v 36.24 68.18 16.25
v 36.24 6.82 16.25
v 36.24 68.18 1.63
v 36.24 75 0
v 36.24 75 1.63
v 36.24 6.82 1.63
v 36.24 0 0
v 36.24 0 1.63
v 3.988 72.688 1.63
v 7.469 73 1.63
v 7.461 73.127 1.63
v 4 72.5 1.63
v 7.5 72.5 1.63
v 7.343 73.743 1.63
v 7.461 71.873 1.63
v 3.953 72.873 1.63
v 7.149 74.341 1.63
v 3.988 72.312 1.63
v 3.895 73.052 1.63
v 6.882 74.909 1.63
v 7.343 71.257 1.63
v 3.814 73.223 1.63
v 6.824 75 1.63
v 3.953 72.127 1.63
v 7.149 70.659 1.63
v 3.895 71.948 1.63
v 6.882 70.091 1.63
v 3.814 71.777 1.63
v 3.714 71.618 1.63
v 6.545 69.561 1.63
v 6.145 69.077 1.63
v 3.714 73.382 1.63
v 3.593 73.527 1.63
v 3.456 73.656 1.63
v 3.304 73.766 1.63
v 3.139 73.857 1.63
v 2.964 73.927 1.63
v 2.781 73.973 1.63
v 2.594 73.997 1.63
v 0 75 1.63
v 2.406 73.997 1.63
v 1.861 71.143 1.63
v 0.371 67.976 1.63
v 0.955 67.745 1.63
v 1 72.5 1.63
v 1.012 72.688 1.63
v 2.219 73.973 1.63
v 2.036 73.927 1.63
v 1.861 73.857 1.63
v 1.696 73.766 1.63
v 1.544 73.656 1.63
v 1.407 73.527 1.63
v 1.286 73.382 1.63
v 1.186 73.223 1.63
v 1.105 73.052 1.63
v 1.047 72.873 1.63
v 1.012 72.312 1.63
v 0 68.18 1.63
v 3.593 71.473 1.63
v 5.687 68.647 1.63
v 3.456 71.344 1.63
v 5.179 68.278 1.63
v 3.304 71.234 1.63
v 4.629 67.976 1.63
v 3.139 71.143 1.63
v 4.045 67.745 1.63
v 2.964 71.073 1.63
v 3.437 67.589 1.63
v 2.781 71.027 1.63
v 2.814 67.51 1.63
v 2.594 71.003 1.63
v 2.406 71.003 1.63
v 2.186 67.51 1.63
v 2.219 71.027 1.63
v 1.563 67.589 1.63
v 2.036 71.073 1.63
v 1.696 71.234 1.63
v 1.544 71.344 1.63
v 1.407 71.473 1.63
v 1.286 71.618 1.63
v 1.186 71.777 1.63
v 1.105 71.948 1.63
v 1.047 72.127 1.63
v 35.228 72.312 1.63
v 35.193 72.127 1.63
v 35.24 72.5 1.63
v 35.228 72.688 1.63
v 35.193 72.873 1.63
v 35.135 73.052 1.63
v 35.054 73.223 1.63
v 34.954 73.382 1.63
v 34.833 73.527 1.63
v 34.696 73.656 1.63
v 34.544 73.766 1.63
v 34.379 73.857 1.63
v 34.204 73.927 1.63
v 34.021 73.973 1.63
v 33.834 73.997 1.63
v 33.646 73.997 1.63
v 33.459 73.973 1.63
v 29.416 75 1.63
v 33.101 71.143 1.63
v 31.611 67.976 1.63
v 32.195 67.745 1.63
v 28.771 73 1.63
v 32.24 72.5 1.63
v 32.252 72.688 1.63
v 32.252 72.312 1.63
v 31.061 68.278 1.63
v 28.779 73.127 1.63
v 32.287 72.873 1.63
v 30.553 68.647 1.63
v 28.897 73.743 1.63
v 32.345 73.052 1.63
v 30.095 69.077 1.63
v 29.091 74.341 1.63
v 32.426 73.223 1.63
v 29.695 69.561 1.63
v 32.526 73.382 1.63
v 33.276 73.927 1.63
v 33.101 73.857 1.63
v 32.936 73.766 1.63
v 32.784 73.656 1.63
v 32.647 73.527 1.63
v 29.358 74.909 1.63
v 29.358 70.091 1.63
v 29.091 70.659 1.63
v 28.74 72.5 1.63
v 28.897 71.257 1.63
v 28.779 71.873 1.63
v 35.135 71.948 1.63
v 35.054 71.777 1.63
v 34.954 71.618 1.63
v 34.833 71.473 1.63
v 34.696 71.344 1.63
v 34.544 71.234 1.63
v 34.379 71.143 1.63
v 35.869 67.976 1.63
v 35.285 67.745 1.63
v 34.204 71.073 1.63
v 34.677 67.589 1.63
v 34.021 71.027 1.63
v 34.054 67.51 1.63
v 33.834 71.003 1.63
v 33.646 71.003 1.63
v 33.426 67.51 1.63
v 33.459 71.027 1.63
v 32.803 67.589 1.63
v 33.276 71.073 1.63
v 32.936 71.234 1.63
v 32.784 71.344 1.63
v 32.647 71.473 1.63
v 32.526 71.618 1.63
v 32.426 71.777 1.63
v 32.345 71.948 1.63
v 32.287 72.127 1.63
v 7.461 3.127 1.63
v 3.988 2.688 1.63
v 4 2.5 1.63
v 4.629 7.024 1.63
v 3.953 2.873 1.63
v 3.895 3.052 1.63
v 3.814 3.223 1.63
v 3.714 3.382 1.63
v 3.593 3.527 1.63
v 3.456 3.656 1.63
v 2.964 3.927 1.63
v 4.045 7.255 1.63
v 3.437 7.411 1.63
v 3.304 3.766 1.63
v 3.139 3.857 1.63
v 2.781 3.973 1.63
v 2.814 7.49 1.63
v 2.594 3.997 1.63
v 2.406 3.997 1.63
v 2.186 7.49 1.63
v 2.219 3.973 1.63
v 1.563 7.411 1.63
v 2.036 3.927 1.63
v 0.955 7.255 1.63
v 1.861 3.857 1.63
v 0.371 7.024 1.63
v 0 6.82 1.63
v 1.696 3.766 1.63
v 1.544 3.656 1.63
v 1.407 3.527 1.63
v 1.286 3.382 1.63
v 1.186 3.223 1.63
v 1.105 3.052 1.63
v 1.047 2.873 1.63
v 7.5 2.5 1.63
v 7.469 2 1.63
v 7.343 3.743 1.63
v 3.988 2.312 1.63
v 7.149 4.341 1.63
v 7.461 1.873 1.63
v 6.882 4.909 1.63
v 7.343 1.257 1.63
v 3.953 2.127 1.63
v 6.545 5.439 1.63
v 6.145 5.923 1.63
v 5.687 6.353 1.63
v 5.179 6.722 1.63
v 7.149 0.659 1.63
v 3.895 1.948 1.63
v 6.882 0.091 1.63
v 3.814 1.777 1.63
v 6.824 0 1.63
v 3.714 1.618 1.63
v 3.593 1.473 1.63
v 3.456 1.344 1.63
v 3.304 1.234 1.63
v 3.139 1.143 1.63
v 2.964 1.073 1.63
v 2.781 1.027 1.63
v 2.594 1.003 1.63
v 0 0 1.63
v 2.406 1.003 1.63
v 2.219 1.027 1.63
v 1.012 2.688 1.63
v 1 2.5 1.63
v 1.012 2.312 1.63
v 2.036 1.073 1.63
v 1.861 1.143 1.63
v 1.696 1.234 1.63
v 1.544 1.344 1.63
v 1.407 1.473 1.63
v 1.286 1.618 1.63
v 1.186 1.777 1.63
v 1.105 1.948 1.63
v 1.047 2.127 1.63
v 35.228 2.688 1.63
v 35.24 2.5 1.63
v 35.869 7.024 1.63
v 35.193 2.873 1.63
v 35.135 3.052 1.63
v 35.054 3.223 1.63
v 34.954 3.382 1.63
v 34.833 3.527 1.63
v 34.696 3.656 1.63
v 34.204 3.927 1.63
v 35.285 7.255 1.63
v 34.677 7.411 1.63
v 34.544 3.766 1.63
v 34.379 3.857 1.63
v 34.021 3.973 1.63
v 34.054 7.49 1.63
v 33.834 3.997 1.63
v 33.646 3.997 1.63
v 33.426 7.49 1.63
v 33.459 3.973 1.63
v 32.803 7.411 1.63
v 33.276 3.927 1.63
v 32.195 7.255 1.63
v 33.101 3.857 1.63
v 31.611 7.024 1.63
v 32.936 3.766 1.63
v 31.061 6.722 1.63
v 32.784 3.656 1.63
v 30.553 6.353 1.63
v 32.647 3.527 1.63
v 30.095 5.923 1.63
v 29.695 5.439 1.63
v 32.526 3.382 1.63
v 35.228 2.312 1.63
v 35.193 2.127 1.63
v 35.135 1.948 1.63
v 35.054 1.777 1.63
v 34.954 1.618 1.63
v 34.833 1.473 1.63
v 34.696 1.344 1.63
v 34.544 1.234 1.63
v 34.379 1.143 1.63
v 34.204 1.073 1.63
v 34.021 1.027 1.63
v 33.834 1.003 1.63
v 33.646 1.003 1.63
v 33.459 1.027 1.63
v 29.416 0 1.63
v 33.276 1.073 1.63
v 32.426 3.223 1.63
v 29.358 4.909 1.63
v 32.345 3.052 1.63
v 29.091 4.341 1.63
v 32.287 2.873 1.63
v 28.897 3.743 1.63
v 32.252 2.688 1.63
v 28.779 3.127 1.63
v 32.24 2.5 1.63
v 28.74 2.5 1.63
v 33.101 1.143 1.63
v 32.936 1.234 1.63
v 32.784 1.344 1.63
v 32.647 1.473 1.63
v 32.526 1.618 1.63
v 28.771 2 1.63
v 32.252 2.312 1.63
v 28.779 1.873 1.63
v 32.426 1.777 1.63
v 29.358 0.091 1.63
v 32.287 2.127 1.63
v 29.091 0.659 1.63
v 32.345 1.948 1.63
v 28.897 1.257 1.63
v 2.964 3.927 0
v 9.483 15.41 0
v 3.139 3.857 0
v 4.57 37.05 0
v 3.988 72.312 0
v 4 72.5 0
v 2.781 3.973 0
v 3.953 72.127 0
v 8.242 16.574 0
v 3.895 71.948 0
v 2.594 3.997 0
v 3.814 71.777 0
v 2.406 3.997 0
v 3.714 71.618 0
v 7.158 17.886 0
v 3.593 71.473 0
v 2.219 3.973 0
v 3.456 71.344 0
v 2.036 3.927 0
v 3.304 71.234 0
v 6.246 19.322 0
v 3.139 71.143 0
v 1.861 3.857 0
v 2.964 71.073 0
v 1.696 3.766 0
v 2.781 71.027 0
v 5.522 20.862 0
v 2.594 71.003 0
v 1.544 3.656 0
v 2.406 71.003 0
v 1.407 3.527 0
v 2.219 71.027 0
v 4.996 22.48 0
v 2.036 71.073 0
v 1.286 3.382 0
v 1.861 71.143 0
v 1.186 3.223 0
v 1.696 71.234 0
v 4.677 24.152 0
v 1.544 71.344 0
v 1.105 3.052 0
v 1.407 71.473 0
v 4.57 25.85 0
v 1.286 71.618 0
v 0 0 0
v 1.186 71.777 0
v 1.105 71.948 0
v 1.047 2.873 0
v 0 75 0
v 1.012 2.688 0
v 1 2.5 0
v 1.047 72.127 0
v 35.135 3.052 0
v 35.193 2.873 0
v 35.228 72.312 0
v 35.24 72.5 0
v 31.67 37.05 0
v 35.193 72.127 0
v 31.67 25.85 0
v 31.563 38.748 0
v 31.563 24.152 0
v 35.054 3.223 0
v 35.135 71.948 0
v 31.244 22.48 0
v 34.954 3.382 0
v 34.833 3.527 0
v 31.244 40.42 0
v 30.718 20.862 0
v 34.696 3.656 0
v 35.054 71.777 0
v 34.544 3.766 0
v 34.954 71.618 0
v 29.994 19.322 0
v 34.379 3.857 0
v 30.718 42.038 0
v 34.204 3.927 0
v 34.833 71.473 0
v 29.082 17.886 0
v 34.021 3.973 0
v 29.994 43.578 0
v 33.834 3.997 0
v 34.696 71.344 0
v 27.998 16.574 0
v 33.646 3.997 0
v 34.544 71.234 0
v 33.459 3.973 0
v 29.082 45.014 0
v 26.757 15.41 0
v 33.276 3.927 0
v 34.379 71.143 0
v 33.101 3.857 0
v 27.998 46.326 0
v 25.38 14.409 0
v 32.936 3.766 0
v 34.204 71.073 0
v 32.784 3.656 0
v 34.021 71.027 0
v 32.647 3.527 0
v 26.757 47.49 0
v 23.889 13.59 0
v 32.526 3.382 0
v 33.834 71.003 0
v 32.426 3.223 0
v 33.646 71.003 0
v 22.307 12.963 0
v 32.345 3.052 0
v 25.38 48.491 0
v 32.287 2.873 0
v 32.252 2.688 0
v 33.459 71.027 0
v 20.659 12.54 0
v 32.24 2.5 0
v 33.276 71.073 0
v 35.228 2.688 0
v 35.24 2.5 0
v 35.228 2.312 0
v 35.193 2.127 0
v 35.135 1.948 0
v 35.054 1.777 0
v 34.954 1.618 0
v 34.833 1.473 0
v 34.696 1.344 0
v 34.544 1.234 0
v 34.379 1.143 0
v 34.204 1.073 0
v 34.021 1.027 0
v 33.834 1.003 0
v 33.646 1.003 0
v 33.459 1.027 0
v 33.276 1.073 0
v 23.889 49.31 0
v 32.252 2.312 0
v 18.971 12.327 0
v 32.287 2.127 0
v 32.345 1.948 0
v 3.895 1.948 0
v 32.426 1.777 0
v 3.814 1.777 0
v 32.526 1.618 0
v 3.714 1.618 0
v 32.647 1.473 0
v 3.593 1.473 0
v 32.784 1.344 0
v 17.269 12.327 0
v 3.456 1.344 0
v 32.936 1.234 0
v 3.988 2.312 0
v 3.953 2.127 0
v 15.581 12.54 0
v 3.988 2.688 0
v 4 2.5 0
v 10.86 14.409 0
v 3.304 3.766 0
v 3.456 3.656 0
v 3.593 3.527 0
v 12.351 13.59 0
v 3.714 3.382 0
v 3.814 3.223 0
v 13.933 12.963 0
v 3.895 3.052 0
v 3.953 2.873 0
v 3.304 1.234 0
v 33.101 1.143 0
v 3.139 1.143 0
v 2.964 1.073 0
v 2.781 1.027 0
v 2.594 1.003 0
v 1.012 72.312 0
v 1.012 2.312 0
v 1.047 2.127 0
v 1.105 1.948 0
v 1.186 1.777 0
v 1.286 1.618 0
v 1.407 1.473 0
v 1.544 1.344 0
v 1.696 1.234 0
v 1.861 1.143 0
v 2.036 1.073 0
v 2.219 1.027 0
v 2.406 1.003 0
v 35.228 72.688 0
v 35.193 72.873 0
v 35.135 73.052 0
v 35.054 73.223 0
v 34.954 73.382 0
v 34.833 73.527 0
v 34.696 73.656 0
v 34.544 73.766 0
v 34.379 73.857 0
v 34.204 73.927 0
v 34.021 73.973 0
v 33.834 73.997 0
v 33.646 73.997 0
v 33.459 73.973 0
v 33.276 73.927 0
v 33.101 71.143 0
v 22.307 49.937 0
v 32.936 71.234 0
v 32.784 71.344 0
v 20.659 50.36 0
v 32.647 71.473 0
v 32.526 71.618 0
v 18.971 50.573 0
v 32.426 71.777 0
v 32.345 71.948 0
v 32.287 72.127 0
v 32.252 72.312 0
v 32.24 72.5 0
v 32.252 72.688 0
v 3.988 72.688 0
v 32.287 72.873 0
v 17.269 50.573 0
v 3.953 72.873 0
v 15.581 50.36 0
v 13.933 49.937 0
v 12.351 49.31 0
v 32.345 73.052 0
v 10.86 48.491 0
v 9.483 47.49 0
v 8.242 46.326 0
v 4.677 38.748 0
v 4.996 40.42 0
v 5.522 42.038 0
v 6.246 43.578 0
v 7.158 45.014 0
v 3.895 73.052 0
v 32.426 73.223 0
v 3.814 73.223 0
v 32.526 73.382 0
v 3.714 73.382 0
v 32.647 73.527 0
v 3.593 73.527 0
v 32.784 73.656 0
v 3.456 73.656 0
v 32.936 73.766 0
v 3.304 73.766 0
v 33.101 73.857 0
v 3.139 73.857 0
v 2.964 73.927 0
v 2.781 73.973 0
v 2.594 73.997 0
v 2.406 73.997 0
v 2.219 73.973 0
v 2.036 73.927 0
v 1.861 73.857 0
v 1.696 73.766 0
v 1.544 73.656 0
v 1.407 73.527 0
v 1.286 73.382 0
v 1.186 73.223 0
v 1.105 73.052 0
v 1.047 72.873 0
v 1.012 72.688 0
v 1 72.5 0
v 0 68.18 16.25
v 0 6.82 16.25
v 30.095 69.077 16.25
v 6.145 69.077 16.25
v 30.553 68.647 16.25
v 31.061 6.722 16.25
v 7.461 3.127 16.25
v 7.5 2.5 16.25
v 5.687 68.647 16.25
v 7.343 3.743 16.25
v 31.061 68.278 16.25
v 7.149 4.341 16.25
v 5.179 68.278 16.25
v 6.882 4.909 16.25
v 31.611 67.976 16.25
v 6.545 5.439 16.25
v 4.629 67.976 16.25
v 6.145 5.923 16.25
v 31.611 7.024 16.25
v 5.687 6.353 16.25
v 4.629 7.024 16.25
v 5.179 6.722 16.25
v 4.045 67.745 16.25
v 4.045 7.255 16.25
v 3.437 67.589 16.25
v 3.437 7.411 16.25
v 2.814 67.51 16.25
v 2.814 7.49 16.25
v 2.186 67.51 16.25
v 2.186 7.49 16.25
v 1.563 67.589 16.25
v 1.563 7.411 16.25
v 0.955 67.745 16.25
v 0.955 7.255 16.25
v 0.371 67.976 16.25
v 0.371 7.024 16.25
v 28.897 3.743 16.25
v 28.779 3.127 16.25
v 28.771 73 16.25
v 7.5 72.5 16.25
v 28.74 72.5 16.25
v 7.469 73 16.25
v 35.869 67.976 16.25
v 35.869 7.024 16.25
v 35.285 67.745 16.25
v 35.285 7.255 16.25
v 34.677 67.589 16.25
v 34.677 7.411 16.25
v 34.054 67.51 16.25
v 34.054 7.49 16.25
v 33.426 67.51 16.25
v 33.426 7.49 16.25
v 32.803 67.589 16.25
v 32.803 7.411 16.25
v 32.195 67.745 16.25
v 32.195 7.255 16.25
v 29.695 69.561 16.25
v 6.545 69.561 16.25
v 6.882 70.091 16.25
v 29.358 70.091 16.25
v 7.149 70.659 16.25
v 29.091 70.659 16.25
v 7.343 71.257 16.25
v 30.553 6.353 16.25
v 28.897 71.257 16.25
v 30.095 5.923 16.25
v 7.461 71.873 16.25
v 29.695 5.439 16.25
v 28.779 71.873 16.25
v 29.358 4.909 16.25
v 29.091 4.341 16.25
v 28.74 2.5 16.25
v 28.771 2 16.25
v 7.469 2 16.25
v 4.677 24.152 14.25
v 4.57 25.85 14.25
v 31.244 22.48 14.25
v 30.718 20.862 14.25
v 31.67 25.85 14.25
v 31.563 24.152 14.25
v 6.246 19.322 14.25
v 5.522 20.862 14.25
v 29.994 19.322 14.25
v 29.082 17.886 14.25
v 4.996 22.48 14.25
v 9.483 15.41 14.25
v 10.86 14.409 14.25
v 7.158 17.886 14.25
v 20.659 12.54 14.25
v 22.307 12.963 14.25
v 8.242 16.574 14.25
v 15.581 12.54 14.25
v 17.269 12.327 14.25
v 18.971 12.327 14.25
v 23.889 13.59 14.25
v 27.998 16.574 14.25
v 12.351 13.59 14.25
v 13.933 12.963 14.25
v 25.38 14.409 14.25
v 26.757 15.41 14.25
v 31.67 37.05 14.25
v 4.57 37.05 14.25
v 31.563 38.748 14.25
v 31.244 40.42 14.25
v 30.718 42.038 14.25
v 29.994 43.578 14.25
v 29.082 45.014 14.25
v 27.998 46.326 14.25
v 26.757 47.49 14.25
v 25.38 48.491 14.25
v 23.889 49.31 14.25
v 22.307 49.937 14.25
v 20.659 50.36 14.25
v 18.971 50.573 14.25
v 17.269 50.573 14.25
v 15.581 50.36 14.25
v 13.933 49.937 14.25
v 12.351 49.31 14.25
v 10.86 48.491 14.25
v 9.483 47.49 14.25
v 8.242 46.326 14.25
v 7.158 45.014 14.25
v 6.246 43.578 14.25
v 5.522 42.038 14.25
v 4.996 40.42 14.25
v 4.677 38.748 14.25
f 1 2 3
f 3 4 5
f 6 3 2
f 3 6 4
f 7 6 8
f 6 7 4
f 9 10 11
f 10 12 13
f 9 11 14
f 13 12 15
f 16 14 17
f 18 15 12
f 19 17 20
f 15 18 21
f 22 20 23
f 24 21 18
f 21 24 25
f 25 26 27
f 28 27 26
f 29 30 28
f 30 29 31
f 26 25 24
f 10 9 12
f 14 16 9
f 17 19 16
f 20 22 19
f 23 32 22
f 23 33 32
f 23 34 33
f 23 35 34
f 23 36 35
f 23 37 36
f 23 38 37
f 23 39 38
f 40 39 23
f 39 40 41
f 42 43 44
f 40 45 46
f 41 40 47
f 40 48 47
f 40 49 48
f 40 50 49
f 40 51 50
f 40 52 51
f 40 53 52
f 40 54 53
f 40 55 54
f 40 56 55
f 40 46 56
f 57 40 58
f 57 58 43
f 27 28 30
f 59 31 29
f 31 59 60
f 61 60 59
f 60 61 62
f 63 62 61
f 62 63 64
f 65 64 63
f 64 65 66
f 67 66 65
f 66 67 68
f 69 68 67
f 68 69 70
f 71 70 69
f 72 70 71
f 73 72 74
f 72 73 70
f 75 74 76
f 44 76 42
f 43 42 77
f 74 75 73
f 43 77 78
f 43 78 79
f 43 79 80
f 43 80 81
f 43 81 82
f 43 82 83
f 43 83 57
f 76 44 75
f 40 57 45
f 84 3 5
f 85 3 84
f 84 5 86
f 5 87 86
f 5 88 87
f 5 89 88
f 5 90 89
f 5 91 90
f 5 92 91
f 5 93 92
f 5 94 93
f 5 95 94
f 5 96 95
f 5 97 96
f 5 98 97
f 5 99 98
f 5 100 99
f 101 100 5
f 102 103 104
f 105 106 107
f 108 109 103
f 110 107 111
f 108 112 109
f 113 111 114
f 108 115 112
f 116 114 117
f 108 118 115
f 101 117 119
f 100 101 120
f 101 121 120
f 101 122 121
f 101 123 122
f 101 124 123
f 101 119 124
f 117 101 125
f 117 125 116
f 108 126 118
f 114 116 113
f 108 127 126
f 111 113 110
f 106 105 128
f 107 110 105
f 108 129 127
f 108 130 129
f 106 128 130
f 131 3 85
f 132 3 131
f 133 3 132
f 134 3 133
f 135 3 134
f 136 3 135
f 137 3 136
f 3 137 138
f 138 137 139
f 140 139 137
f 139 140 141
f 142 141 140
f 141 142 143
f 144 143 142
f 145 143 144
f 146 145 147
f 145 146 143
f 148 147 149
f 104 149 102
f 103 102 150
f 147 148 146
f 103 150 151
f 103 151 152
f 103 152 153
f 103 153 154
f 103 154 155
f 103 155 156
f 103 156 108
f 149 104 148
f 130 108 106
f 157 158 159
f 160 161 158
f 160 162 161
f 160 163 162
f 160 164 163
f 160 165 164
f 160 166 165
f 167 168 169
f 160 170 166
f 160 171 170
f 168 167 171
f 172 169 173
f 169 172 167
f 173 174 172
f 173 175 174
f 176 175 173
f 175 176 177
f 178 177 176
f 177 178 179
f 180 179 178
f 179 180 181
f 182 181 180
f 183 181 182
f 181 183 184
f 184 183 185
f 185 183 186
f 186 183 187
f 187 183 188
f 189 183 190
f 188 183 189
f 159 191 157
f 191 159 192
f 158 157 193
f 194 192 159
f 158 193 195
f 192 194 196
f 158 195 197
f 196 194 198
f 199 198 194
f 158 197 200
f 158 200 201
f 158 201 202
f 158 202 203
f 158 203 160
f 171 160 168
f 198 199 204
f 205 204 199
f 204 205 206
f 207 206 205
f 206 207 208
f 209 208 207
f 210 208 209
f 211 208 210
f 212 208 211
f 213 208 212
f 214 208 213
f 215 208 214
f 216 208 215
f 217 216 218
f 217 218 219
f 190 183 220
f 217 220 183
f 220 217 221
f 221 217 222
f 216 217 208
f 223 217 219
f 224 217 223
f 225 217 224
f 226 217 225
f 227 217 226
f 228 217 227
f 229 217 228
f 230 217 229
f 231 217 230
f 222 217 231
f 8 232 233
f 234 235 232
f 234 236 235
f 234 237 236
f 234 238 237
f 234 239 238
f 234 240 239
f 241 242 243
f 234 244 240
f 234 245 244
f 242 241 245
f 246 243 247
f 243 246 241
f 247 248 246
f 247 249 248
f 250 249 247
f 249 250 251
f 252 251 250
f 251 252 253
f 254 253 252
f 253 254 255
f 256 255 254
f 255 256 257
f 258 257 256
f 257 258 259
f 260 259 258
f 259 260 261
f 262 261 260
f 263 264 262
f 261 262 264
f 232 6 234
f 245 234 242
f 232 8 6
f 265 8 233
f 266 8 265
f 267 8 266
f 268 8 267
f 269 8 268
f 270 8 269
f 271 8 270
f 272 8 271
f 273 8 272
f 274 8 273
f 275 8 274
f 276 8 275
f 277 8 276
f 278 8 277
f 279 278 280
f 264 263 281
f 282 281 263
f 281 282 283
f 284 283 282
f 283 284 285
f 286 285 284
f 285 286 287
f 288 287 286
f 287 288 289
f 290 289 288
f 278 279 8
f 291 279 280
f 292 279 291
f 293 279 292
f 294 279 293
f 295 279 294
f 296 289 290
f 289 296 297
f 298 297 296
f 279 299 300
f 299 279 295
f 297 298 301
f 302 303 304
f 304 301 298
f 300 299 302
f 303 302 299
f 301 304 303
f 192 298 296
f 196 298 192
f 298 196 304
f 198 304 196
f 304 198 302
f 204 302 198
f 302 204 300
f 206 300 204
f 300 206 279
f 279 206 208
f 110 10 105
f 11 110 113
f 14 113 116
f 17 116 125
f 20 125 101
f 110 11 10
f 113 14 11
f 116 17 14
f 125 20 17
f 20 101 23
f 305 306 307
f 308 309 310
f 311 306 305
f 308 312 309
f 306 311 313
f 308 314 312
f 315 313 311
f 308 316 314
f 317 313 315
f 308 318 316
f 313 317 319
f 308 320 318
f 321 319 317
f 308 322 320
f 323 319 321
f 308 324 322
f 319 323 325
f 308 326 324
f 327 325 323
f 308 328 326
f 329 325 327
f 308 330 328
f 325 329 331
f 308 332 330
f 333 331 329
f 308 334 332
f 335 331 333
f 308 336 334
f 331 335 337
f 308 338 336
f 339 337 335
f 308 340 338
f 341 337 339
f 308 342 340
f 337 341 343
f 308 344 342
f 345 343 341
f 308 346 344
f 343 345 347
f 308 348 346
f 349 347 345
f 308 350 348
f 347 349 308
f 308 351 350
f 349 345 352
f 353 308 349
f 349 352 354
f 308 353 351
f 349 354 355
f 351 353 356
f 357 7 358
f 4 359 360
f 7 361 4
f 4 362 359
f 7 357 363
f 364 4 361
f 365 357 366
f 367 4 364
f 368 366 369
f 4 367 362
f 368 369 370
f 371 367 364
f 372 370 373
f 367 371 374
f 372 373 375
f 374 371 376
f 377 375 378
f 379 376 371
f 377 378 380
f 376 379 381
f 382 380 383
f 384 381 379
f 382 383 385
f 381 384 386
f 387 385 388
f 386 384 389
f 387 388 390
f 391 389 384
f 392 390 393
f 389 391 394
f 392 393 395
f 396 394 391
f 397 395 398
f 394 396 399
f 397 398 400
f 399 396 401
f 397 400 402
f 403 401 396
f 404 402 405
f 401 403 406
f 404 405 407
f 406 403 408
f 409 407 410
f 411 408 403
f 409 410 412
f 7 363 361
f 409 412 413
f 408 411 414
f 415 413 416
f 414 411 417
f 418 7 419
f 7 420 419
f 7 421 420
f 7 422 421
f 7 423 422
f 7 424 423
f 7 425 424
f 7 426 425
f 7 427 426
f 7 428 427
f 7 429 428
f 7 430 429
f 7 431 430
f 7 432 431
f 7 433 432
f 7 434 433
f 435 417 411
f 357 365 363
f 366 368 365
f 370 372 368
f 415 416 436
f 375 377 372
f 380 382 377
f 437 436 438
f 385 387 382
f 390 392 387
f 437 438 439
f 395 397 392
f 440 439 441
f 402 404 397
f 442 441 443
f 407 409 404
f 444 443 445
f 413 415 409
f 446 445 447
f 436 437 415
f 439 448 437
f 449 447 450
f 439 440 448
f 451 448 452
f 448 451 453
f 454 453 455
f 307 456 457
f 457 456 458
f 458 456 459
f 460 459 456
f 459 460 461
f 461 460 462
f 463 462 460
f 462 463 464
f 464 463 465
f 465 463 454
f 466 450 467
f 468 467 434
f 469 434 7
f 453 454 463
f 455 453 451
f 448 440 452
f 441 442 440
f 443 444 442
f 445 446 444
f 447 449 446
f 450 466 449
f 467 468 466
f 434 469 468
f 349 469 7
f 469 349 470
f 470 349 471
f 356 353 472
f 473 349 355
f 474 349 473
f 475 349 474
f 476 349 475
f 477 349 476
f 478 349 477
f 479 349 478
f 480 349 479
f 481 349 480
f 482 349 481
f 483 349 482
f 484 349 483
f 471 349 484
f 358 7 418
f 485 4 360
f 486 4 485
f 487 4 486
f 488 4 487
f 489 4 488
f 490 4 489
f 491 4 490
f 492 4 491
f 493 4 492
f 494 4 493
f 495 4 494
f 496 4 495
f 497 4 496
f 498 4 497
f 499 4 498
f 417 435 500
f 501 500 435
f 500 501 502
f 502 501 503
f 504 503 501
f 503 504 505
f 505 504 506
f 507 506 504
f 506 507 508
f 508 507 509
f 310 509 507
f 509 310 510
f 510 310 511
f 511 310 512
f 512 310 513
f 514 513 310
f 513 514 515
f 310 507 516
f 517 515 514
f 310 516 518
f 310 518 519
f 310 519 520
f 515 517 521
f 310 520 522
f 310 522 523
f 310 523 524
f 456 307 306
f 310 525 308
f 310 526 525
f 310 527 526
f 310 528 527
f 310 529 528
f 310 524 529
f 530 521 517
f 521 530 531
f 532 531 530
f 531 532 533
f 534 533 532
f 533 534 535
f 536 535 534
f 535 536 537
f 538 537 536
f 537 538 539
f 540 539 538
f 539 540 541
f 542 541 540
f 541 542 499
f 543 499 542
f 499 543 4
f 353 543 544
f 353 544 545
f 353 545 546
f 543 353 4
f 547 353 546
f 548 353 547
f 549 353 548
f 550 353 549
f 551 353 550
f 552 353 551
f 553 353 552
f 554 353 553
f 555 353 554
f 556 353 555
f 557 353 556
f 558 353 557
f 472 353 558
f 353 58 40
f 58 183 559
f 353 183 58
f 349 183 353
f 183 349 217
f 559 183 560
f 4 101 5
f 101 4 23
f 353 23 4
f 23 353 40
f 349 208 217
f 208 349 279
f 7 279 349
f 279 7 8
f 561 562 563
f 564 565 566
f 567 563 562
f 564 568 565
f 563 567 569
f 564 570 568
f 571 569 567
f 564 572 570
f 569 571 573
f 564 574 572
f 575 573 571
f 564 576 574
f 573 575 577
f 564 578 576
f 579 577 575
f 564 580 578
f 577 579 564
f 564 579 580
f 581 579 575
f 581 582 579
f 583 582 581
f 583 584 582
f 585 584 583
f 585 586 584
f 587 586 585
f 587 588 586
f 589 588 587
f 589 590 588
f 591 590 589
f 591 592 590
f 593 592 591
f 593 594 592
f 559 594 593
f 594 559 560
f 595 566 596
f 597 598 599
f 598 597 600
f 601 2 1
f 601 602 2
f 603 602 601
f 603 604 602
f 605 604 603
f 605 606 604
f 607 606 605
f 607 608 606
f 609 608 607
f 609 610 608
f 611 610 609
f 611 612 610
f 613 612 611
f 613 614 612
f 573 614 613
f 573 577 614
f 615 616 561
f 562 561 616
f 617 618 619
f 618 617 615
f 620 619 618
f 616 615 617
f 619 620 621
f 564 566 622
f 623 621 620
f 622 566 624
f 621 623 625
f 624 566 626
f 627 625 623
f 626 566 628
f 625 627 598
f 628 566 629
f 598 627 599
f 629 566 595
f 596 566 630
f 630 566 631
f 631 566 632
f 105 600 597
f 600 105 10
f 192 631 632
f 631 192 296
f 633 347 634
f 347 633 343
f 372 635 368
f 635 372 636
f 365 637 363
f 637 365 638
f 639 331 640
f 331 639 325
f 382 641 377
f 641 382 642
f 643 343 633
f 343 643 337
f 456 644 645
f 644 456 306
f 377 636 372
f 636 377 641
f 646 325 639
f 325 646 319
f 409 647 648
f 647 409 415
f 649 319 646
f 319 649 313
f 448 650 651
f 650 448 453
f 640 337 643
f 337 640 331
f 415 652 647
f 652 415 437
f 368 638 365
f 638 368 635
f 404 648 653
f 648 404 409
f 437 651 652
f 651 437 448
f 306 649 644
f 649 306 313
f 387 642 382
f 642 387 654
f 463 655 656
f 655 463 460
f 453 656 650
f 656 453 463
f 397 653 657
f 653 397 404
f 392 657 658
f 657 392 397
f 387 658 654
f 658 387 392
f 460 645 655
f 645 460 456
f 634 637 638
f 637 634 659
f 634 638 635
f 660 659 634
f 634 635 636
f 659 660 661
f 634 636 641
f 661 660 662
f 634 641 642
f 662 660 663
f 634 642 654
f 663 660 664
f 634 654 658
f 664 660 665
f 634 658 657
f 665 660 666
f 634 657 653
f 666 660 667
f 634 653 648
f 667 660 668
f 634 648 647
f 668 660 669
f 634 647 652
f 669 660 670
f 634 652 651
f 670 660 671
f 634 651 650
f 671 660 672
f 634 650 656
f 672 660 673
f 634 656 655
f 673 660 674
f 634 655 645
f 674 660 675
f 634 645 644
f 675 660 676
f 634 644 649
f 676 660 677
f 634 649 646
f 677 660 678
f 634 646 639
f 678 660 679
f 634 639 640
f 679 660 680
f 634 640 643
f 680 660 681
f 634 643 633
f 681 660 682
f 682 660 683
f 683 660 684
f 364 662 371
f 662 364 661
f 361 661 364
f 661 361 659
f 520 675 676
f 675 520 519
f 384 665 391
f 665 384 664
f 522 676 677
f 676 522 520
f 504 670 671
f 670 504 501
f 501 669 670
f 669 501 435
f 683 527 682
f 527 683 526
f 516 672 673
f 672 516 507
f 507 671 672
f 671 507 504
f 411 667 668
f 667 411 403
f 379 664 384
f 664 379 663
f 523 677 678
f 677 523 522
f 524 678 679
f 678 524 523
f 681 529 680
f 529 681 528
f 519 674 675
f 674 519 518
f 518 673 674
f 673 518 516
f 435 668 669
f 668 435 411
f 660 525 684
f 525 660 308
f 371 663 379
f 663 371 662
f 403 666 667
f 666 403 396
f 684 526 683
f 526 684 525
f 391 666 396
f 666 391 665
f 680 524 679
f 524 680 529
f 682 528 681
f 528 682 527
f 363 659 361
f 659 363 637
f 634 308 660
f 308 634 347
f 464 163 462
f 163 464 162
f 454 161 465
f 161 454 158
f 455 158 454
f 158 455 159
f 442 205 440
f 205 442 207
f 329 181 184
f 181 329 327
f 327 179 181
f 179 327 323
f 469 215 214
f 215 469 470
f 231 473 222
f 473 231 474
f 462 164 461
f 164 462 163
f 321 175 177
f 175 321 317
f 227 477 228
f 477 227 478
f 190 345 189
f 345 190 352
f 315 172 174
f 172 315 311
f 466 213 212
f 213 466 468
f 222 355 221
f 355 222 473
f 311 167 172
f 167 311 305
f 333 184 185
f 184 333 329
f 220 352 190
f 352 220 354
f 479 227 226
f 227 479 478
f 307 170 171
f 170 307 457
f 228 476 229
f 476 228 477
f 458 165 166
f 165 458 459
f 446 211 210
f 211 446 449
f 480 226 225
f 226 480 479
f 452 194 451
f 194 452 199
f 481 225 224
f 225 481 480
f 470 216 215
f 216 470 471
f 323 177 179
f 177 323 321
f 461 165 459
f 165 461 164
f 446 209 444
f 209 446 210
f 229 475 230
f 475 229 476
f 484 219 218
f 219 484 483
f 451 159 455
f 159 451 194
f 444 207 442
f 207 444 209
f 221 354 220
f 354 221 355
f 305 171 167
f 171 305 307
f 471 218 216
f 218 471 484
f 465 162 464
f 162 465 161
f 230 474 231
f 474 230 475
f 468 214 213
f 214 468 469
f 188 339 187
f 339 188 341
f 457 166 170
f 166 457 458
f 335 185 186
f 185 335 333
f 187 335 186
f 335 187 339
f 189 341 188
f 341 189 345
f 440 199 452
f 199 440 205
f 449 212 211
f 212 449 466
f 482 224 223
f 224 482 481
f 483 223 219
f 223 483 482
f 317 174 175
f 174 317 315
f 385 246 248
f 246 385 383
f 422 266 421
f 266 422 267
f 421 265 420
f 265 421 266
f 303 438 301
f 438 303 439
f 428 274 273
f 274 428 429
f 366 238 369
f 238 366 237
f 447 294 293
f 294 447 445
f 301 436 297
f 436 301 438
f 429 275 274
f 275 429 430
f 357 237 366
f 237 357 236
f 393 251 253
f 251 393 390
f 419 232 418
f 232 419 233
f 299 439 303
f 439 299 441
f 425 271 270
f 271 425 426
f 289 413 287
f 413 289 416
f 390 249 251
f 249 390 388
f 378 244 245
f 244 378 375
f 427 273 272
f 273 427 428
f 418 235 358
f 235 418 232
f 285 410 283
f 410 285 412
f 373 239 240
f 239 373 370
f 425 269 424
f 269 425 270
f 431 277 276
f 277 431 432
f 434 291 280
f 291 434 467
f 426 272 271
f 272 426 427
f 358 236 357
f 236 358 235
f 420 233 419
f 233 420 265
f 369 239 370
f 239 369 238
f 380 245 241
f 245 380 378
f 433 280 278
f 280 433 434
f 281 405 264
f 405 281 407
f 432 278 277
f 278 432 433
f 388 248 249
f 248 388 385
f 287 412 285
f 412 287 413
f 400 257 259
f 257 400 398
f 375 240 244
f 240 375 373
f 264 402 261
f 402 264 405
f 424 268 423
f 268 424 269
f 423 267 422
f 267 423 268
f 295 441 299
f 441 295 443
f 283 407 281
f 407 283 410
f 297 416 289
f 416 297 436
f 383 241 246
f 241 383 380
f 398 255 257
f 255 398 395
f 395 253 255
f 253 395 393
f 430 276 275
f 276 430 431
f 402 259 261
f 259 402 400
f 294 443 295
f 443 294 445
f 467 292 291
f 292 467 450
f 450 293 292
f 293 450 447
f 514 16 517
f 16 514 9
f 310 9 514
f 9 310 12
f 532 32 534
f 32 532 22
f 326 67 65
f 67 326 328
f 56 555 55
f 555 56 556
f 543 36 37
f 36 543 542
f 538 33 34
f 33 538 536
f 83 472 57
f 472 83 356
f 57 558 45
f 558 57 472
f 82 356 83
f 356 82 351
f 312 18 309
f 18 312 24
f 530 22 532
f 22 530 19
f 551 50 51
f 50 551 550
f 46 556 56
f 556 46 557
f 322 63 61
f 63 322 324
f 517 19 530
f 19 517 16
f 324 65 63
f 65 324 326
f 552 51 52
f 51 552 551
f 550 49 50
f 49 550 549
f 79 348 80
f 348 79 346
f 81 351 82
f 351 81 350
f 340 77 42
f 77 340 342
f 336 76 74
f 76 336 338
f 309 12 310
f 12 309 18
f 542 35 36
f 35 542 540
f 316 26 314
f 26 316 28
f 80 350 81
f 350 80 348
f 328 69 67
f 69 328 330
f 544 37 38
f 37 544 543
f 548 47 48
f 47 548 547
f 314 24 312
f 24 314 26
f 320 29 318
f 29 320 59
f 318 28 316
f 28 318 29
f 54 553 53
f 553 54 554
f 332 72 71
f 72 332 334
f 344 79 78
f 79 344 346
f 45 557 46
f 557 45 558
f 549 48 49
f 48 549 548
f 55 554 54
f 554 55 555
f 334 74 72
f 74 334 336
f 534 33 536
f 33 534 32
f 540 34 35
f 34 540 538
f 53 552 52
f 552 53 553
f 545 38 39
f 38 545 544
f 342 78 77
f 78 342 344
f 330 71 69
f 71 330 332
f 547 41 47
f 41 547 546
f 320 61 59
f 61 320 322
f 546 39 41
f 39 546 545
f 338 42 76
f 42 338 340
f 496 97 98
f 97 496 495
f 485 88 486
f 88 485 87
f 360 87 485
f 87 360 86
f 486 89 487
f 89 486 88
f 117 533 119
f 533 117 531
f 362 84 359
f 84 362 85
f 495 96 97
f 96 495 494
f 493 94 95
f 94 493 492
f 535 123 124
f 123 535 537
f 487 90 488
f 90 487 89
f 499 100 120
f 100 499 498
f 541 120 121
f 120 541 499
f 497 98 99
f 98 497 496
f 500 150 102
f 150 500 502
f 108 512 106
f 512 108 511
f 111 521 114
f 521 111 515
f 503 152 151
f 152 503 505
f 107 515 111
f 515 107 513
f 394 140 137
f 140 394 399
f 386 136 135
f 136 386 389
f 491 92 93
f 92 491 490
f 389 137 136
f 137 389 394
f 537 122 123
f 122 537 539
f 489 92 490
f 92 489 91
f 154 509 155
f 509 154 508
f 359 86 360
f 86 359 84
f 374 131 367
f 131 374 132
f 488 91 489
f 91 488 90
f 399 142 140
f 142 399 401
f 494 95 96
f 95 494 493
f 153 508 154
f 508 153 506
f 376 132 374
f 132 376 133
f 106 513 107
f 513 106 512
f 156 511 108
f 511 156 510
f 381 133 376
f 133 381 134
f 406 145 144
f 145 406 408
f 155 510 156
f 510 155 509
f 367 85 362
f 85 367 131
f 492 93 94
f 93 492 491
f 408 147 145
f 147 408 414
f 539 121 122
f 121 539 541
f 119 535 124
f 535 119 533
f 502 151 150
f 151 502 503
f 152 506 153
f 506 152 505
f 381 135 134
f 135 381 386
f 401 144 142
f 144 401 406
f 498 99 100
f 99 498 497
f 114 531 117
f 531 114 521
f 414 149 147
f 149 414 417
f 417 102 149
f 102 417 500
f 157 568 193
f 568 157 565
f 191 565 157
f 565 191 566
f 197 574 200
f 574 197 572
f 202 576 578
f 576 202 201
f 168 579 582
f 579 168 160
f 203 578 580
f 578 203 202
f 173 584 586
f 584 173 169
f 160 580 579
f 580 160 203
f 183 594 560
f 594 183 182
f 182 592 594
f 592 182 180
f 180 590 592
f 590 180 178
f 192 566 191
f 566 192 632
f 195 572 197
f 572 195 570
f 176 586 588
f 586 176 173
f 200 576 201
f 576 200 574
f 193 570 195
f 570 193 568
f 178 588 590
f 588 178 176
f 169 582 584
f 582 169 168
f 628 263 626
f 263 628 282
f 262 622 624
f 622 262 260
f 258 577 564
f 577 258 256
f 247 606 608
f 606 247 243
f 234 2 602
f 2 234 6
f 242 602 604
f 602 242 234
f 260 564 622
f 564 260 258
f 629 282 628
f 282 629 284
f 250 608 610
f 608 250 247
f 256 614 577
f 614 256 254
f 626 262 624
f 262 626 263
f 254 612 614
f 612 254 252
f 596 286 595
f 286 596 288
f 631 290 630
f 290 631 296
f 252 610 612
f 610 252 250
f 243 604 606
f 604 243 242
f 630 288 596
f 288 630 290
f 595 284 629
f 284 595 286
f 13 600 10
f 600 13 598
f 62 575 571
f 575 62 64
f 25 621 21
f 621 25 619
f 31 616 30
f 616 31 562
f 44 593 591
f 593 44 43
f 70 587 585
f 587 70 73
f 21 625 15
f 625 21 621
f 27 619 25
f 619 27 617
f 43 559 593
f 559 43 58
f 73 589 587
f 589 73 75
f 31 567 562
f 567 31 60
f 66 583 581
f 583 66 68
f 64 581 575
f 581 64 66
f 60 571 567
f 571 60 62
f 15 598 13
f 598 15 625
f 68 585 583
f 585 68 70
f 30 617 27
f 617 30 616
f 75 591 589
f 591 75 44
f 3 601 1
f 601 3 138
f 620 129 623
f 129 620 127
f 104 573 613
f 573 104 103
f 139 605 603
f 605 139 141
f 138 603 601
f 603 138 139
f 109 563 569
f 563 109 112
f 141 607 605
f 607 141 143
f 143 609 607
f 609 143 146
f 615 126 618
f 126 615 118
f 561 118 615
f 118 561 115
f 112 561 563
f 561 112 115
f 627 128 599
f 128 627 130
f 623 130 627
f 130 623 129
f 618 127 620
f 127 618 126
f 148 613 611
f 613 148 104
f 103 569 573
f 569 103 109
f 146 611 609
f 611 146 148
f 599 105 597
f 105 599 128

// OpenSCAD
// file: parametre.scad
/* pour le rendu openscad */

// pour la finesse de rendu
// plus c'est élevé, mieux c'est... mais ça prend plus de temps et de ressource
resolution = 50;

// pour enlever de la matière des objets dans openscad et être certain qu'il ne reste pas un bout de face
difference_objet_marge = 20;





/* pour le design du jeu  */

// tout est en millimetre !!!!

// configuration globale
////////////////////////

// quand on perce et que l'on va insérer quelque chose dedans...
// il faut un peu de vide en plus ;)
padding_percage = 0.5;

// espace supplémentaire pour la largeur de rainure
padding_rainure = 1;

// profondeur standard pour une rainure
profondeur_rainure = 2; // moins que epaisseur_tole_grille_led et que epaisseur_tole_grille_led ! Il faut qu'il reste de la matière !

// définition de base du jeu
nombre_colonnes = 7;
nombre_lignes = 6;


// les boutons de sélection de colonne et du nombre de joueurs
//////////////////////////////////////////////////////////////
diametre_bouton_arcade = 30;
rayon_bouton_arcade = diametre_bouton_arcade / 2;
diametre_trou_bouton_arcade = 20; // TODO: à valider !
rayon_trou_bouton_arcade = diametre_trou_bouton_arcade / 2;


// haut-parleur HP8R
////////////////////
HP8R_epaisseur_totale = 16.25;
HP8R_largeur = 36.24;
HP8R_hauteur = 75;
HP8R_epaisseur_tole = 1.63;
HP8R_hauteur_caisson = 71;
//HP8R_epaisseur_caisson = 16.25 - HP8R_epaisseur_tole;
HP8R_decalage_hauteur_trou = 12.3;
HP8R_largeur_trou = 27.1;
HP8R_hauteur_trou = 38.3;
HP8R_epaisseur_trou = HP8R_epaisseur_totale - 2;
HP8R_diametre_creuse_coins = 10;
HP8R_diametre_creuse_fixation = 3;


// cadrillage autour des LEDs
/////////////////////////////
profondeur_separateur_led = 15; // TODO: à valider !


// la grille de LEDS
////////////////////
epaisseur_tole_grille_led = 3;
diametre_trou_led = 10; // TODO: à valider !
largeur_rainure_grille_led = epaisseur_tole_grille_led + padding_rainure;
profondeur_rainure_grille_led = profondeur_rainure; // moins que epaisseur_tole_grille_led !!!


// pour stocker les cables et l'électronique
////////////////////////////////////////////
espace_vide_milieu = 40; // TODO: à valider !


// le plexi blanc derrière le mur, pour faire les fenêtres
//////////////////////////////////////////////////////////
epaisseur_plexi_blanc = 2;
transparence_plexi = 1;


// le mur Star Wars fenetré
///////////////////////////
epaisseur_tole_mur = 2;
taille_fenetre = diametre_bouton_arcade; // valeur à fixer si bouton plus petit, ici je m'adapte à cette taille de bouton
ecart_entre_fenetre = 5; // au jugé ;)
marge_mur = 10; // pour aérer le tour

// on peut maintenant calculer la surface du jeu !
largeur_mur = marge_mur + (nombre_colonnes * taille_fenetre) + ((nombre_colonnes - 1) * ecart_entre_fenetre) + marge_mur;
echo("largeur_mur=", largeur_mur);
hauteur_mur = marge_mur + (nombre_lignes * taille_fenetre) + ((nombre_lignes - 1) * ecart_entre_fenetre) + marge_mur;
echo("hauteur_mur=", hauteur_mur);

// calcul de l'épaisseur complète du jeu
epaisseur_jeu = espace_vide_milieu + 2 * epaisseur_tole_mur + 2 * epaisseur_plexi_blanc + 2 * epaisseur_tole_grille_led + 2 * profondeur_separateur_led;


// la plaque du dessus avec les boutons de choix de colonne
///////////////////////////////////////////////////////////
epaisseur_tole_dessus = 4; // ce "chapeau" sera rainurée pour tenir les plaques !
debord_rainure = 5; // qui dépasse de devant et derrière 
profondeur_dessus = epaisseur_jeu + 2 * debord_rainure;
marge_largeur_dessus = (largeur_mur - (nombre_colonnes * diametre_bouton_arcade) - ((nombre_colonnes - 1) * ecart_entre_fenetre)) / 2;
largeur_rainure_mur_plexi = epaisseur_tole_mur + epaisseur_plexi_blanc + padding_rainure;
profondeur_rainure_mur_plexi = profondeur_rainure; // moins que epaisseur_tole_dessus !!!
echo("profondeur_dessus=", profondeur_dessus);


// la plaque de dessous
///////////////////////
epaisseur_tole_dessous = 4; // ce socle sera rainurée pour tenir les plaques !
dessous_debord_rainure = 50;
profondeur_dessous = epaisseur_jeu + 2 * dessous_debord_rainure;
echo("profondeur_dessous=", profondeur_dessous);


hauteur_cote = epaisseur_tole_dessous + hauteur_mur + epaisseur_tole_dessus - 2 * profondeur_rainure_grille_led;
largeur_cote = profondeur_dessus;


// côté gauche
//////////////
epaisseur_tole_gauche = 2;


// côté droit
/////////////
epaisseur_tole_droit = 2;
// main file
include <parametre.scad>

// pour exporter en .dxf
//projection(cut = false) 
haut_parleur_HP8R();

module haut_parleur_HP8R() {
	color([0.3, 0.3, 0.3])
		difference() {
			union() {
				// la plaque de fixation
				cube(size=[HP8R_largeur, HP8R_hauteur, HP8R_epaisseur_tole]);
				// le caisson
				translate([0, (HP8R_hauteur - HP8R_hauteur_caisson) / 2, 0])
					cube(size=[HP8R_largeur, HP8R_hauteur_caisson, HP8R_epaisseur_totale]);
			}

			// les 4 coins
			translate([HP8R_diametre_creuse_coins / 4, HP8R_diametre_creuse_coins / 4, HP8R_epaisseur_tole])
				cylinder(HP8R_epaisseur_totale + difference_objet_marge, d=HP8R_diametre_creuse_coins, $fn=resolution);
			translate([HP8R_largeur - HP8R_diametre_creuse_coins / 2 + HP8R_diametre_creuse_coins / 4, HP8R_diametre_creuse_coins / 4, HP8R_epaisseur_tole])
				cylinder(HP8R_epaisseur_totale + difference_objet_marge, d=HP8R_diametre_creuse_coins, $fn=resolution);
			translate([HP8R_diametre_creuse_coins / 4, HP8R_hauteur - HP8R_diametre_creuse_coins / 2 + HP8R_diametre_creuse_coins / 4, HP8R_epaisseur_tole])
				cylinder(HP8R_epaisseur_totale + difference_objet_marge, d=HP8R_diametre_creuse_coins, $fn=resolution);
			translate([HP8R_largeur - HP8R_diametre_creuse_coins / 2 + HP8R_diametre_creuse_coins / 4, HP8R_hauteur - HP8R_diametre_creuse_coins / 2 + HP8R_diametre_creuse_coins / 4, HP8R_epaisseur_tole])
				cylinder(HP8R_epaisseur_totale + difference_objet_marge, d=HP8R_diametre_creuse_coins, $fn=resolution);

			haut_parleur_HP8R_trous();
		}

}

module haut_parleur_HP8R_trouHP() {
	union() {
		// arrondi HP
		translate([HP8R_largeur / 2, HP8R_decalage_hauteur_trou + HP8R_largeur_trou / 2, -difference_objet_marge])
			cylinder(HP8R_epaisseur_trou + difference_objet_marge, d=HP8R_largeur_trou, $fn=resolution);
		translate([HP8R_largeur / 2, HP8R_decalage_hauteur_trou + HP8R_hauteur_trou - HP8R_largeur_trou / 2, -difference_objet_marge])
			cylinder(HP8R_epaisseur_trou + difference_objet_marge, d=HP8R_largeur_trou, $fn=resolution);

		// le trou HP
		translate([(HP8R_largeur - HP8R_largeur_trou) / 2, HP8R_decalage_hauteur_trou + HP8R_largeur_trou / 2, -difference_objet_marge])
				cube(size=[HP8R_largeur_trou, HP8R_hauteur_trou - HP8R_largeur_trou, HP8R_epaisseur_trou + difference_objet_marge]);
	}
}

module haut_parleur_HP8R_trousFixation() {
	// les 4 trous pour fixation
	translate([HP8R_diametre_creuse_coins / 4, HP8R_diametre_creuse_coins / 4, -difference_objet_marge/2])
		cylinder(HP8R_epaisseur_tole + difference_objet_marge, d=HP8R_diametre_creuse_fixation, $fn=resolution);
	translate([HP8R_largeur - HP8R_diametre_creuse_coins / 2 + HP8R_diametre_creuse_coins / 4, HP8R_diametre_creuse_coins / 4, -difference_objet_marge/2])
		cylinder(HP8R_epaisseur_tole + difference_objet_marge, d=HP8R_diametre_creuse_fixation, $fn=resolution);
	translate([HP8R_diametre_creuse_coins / 4, HP8R_hauteur - HP8R_diametre_creuse_coins / 2 + HP8R_diametre_creuse_coins / 4, -difference_objet_marge/2])
		cylinder(HP8R_epaisseur_tole + difference_objet_marge, d=HP8R_diametre_creuse_fixation, $fn=resolution);
	translate([HP8R_largeur - HP8R_diametre_creuse_coins / 2 + HP8R_diametre_creuse_coins / 4, HP8R_hauteur - HP8R_diametre_creuse_coins / 2 + HP8R_diametre_creuse_coins / 4, -difference_objet_marge/2])
		cylinder(HP8R_epaisseur_tole + difference_objet_marge, d=HP8R_diametre_creuse_fixation, $fn=resolution);
}

module haut_parleur_HP8R_trous() {
	haut_parleur_HP8R_trouHP();
	haut_parleur_HP8R_trousFixation();
}
